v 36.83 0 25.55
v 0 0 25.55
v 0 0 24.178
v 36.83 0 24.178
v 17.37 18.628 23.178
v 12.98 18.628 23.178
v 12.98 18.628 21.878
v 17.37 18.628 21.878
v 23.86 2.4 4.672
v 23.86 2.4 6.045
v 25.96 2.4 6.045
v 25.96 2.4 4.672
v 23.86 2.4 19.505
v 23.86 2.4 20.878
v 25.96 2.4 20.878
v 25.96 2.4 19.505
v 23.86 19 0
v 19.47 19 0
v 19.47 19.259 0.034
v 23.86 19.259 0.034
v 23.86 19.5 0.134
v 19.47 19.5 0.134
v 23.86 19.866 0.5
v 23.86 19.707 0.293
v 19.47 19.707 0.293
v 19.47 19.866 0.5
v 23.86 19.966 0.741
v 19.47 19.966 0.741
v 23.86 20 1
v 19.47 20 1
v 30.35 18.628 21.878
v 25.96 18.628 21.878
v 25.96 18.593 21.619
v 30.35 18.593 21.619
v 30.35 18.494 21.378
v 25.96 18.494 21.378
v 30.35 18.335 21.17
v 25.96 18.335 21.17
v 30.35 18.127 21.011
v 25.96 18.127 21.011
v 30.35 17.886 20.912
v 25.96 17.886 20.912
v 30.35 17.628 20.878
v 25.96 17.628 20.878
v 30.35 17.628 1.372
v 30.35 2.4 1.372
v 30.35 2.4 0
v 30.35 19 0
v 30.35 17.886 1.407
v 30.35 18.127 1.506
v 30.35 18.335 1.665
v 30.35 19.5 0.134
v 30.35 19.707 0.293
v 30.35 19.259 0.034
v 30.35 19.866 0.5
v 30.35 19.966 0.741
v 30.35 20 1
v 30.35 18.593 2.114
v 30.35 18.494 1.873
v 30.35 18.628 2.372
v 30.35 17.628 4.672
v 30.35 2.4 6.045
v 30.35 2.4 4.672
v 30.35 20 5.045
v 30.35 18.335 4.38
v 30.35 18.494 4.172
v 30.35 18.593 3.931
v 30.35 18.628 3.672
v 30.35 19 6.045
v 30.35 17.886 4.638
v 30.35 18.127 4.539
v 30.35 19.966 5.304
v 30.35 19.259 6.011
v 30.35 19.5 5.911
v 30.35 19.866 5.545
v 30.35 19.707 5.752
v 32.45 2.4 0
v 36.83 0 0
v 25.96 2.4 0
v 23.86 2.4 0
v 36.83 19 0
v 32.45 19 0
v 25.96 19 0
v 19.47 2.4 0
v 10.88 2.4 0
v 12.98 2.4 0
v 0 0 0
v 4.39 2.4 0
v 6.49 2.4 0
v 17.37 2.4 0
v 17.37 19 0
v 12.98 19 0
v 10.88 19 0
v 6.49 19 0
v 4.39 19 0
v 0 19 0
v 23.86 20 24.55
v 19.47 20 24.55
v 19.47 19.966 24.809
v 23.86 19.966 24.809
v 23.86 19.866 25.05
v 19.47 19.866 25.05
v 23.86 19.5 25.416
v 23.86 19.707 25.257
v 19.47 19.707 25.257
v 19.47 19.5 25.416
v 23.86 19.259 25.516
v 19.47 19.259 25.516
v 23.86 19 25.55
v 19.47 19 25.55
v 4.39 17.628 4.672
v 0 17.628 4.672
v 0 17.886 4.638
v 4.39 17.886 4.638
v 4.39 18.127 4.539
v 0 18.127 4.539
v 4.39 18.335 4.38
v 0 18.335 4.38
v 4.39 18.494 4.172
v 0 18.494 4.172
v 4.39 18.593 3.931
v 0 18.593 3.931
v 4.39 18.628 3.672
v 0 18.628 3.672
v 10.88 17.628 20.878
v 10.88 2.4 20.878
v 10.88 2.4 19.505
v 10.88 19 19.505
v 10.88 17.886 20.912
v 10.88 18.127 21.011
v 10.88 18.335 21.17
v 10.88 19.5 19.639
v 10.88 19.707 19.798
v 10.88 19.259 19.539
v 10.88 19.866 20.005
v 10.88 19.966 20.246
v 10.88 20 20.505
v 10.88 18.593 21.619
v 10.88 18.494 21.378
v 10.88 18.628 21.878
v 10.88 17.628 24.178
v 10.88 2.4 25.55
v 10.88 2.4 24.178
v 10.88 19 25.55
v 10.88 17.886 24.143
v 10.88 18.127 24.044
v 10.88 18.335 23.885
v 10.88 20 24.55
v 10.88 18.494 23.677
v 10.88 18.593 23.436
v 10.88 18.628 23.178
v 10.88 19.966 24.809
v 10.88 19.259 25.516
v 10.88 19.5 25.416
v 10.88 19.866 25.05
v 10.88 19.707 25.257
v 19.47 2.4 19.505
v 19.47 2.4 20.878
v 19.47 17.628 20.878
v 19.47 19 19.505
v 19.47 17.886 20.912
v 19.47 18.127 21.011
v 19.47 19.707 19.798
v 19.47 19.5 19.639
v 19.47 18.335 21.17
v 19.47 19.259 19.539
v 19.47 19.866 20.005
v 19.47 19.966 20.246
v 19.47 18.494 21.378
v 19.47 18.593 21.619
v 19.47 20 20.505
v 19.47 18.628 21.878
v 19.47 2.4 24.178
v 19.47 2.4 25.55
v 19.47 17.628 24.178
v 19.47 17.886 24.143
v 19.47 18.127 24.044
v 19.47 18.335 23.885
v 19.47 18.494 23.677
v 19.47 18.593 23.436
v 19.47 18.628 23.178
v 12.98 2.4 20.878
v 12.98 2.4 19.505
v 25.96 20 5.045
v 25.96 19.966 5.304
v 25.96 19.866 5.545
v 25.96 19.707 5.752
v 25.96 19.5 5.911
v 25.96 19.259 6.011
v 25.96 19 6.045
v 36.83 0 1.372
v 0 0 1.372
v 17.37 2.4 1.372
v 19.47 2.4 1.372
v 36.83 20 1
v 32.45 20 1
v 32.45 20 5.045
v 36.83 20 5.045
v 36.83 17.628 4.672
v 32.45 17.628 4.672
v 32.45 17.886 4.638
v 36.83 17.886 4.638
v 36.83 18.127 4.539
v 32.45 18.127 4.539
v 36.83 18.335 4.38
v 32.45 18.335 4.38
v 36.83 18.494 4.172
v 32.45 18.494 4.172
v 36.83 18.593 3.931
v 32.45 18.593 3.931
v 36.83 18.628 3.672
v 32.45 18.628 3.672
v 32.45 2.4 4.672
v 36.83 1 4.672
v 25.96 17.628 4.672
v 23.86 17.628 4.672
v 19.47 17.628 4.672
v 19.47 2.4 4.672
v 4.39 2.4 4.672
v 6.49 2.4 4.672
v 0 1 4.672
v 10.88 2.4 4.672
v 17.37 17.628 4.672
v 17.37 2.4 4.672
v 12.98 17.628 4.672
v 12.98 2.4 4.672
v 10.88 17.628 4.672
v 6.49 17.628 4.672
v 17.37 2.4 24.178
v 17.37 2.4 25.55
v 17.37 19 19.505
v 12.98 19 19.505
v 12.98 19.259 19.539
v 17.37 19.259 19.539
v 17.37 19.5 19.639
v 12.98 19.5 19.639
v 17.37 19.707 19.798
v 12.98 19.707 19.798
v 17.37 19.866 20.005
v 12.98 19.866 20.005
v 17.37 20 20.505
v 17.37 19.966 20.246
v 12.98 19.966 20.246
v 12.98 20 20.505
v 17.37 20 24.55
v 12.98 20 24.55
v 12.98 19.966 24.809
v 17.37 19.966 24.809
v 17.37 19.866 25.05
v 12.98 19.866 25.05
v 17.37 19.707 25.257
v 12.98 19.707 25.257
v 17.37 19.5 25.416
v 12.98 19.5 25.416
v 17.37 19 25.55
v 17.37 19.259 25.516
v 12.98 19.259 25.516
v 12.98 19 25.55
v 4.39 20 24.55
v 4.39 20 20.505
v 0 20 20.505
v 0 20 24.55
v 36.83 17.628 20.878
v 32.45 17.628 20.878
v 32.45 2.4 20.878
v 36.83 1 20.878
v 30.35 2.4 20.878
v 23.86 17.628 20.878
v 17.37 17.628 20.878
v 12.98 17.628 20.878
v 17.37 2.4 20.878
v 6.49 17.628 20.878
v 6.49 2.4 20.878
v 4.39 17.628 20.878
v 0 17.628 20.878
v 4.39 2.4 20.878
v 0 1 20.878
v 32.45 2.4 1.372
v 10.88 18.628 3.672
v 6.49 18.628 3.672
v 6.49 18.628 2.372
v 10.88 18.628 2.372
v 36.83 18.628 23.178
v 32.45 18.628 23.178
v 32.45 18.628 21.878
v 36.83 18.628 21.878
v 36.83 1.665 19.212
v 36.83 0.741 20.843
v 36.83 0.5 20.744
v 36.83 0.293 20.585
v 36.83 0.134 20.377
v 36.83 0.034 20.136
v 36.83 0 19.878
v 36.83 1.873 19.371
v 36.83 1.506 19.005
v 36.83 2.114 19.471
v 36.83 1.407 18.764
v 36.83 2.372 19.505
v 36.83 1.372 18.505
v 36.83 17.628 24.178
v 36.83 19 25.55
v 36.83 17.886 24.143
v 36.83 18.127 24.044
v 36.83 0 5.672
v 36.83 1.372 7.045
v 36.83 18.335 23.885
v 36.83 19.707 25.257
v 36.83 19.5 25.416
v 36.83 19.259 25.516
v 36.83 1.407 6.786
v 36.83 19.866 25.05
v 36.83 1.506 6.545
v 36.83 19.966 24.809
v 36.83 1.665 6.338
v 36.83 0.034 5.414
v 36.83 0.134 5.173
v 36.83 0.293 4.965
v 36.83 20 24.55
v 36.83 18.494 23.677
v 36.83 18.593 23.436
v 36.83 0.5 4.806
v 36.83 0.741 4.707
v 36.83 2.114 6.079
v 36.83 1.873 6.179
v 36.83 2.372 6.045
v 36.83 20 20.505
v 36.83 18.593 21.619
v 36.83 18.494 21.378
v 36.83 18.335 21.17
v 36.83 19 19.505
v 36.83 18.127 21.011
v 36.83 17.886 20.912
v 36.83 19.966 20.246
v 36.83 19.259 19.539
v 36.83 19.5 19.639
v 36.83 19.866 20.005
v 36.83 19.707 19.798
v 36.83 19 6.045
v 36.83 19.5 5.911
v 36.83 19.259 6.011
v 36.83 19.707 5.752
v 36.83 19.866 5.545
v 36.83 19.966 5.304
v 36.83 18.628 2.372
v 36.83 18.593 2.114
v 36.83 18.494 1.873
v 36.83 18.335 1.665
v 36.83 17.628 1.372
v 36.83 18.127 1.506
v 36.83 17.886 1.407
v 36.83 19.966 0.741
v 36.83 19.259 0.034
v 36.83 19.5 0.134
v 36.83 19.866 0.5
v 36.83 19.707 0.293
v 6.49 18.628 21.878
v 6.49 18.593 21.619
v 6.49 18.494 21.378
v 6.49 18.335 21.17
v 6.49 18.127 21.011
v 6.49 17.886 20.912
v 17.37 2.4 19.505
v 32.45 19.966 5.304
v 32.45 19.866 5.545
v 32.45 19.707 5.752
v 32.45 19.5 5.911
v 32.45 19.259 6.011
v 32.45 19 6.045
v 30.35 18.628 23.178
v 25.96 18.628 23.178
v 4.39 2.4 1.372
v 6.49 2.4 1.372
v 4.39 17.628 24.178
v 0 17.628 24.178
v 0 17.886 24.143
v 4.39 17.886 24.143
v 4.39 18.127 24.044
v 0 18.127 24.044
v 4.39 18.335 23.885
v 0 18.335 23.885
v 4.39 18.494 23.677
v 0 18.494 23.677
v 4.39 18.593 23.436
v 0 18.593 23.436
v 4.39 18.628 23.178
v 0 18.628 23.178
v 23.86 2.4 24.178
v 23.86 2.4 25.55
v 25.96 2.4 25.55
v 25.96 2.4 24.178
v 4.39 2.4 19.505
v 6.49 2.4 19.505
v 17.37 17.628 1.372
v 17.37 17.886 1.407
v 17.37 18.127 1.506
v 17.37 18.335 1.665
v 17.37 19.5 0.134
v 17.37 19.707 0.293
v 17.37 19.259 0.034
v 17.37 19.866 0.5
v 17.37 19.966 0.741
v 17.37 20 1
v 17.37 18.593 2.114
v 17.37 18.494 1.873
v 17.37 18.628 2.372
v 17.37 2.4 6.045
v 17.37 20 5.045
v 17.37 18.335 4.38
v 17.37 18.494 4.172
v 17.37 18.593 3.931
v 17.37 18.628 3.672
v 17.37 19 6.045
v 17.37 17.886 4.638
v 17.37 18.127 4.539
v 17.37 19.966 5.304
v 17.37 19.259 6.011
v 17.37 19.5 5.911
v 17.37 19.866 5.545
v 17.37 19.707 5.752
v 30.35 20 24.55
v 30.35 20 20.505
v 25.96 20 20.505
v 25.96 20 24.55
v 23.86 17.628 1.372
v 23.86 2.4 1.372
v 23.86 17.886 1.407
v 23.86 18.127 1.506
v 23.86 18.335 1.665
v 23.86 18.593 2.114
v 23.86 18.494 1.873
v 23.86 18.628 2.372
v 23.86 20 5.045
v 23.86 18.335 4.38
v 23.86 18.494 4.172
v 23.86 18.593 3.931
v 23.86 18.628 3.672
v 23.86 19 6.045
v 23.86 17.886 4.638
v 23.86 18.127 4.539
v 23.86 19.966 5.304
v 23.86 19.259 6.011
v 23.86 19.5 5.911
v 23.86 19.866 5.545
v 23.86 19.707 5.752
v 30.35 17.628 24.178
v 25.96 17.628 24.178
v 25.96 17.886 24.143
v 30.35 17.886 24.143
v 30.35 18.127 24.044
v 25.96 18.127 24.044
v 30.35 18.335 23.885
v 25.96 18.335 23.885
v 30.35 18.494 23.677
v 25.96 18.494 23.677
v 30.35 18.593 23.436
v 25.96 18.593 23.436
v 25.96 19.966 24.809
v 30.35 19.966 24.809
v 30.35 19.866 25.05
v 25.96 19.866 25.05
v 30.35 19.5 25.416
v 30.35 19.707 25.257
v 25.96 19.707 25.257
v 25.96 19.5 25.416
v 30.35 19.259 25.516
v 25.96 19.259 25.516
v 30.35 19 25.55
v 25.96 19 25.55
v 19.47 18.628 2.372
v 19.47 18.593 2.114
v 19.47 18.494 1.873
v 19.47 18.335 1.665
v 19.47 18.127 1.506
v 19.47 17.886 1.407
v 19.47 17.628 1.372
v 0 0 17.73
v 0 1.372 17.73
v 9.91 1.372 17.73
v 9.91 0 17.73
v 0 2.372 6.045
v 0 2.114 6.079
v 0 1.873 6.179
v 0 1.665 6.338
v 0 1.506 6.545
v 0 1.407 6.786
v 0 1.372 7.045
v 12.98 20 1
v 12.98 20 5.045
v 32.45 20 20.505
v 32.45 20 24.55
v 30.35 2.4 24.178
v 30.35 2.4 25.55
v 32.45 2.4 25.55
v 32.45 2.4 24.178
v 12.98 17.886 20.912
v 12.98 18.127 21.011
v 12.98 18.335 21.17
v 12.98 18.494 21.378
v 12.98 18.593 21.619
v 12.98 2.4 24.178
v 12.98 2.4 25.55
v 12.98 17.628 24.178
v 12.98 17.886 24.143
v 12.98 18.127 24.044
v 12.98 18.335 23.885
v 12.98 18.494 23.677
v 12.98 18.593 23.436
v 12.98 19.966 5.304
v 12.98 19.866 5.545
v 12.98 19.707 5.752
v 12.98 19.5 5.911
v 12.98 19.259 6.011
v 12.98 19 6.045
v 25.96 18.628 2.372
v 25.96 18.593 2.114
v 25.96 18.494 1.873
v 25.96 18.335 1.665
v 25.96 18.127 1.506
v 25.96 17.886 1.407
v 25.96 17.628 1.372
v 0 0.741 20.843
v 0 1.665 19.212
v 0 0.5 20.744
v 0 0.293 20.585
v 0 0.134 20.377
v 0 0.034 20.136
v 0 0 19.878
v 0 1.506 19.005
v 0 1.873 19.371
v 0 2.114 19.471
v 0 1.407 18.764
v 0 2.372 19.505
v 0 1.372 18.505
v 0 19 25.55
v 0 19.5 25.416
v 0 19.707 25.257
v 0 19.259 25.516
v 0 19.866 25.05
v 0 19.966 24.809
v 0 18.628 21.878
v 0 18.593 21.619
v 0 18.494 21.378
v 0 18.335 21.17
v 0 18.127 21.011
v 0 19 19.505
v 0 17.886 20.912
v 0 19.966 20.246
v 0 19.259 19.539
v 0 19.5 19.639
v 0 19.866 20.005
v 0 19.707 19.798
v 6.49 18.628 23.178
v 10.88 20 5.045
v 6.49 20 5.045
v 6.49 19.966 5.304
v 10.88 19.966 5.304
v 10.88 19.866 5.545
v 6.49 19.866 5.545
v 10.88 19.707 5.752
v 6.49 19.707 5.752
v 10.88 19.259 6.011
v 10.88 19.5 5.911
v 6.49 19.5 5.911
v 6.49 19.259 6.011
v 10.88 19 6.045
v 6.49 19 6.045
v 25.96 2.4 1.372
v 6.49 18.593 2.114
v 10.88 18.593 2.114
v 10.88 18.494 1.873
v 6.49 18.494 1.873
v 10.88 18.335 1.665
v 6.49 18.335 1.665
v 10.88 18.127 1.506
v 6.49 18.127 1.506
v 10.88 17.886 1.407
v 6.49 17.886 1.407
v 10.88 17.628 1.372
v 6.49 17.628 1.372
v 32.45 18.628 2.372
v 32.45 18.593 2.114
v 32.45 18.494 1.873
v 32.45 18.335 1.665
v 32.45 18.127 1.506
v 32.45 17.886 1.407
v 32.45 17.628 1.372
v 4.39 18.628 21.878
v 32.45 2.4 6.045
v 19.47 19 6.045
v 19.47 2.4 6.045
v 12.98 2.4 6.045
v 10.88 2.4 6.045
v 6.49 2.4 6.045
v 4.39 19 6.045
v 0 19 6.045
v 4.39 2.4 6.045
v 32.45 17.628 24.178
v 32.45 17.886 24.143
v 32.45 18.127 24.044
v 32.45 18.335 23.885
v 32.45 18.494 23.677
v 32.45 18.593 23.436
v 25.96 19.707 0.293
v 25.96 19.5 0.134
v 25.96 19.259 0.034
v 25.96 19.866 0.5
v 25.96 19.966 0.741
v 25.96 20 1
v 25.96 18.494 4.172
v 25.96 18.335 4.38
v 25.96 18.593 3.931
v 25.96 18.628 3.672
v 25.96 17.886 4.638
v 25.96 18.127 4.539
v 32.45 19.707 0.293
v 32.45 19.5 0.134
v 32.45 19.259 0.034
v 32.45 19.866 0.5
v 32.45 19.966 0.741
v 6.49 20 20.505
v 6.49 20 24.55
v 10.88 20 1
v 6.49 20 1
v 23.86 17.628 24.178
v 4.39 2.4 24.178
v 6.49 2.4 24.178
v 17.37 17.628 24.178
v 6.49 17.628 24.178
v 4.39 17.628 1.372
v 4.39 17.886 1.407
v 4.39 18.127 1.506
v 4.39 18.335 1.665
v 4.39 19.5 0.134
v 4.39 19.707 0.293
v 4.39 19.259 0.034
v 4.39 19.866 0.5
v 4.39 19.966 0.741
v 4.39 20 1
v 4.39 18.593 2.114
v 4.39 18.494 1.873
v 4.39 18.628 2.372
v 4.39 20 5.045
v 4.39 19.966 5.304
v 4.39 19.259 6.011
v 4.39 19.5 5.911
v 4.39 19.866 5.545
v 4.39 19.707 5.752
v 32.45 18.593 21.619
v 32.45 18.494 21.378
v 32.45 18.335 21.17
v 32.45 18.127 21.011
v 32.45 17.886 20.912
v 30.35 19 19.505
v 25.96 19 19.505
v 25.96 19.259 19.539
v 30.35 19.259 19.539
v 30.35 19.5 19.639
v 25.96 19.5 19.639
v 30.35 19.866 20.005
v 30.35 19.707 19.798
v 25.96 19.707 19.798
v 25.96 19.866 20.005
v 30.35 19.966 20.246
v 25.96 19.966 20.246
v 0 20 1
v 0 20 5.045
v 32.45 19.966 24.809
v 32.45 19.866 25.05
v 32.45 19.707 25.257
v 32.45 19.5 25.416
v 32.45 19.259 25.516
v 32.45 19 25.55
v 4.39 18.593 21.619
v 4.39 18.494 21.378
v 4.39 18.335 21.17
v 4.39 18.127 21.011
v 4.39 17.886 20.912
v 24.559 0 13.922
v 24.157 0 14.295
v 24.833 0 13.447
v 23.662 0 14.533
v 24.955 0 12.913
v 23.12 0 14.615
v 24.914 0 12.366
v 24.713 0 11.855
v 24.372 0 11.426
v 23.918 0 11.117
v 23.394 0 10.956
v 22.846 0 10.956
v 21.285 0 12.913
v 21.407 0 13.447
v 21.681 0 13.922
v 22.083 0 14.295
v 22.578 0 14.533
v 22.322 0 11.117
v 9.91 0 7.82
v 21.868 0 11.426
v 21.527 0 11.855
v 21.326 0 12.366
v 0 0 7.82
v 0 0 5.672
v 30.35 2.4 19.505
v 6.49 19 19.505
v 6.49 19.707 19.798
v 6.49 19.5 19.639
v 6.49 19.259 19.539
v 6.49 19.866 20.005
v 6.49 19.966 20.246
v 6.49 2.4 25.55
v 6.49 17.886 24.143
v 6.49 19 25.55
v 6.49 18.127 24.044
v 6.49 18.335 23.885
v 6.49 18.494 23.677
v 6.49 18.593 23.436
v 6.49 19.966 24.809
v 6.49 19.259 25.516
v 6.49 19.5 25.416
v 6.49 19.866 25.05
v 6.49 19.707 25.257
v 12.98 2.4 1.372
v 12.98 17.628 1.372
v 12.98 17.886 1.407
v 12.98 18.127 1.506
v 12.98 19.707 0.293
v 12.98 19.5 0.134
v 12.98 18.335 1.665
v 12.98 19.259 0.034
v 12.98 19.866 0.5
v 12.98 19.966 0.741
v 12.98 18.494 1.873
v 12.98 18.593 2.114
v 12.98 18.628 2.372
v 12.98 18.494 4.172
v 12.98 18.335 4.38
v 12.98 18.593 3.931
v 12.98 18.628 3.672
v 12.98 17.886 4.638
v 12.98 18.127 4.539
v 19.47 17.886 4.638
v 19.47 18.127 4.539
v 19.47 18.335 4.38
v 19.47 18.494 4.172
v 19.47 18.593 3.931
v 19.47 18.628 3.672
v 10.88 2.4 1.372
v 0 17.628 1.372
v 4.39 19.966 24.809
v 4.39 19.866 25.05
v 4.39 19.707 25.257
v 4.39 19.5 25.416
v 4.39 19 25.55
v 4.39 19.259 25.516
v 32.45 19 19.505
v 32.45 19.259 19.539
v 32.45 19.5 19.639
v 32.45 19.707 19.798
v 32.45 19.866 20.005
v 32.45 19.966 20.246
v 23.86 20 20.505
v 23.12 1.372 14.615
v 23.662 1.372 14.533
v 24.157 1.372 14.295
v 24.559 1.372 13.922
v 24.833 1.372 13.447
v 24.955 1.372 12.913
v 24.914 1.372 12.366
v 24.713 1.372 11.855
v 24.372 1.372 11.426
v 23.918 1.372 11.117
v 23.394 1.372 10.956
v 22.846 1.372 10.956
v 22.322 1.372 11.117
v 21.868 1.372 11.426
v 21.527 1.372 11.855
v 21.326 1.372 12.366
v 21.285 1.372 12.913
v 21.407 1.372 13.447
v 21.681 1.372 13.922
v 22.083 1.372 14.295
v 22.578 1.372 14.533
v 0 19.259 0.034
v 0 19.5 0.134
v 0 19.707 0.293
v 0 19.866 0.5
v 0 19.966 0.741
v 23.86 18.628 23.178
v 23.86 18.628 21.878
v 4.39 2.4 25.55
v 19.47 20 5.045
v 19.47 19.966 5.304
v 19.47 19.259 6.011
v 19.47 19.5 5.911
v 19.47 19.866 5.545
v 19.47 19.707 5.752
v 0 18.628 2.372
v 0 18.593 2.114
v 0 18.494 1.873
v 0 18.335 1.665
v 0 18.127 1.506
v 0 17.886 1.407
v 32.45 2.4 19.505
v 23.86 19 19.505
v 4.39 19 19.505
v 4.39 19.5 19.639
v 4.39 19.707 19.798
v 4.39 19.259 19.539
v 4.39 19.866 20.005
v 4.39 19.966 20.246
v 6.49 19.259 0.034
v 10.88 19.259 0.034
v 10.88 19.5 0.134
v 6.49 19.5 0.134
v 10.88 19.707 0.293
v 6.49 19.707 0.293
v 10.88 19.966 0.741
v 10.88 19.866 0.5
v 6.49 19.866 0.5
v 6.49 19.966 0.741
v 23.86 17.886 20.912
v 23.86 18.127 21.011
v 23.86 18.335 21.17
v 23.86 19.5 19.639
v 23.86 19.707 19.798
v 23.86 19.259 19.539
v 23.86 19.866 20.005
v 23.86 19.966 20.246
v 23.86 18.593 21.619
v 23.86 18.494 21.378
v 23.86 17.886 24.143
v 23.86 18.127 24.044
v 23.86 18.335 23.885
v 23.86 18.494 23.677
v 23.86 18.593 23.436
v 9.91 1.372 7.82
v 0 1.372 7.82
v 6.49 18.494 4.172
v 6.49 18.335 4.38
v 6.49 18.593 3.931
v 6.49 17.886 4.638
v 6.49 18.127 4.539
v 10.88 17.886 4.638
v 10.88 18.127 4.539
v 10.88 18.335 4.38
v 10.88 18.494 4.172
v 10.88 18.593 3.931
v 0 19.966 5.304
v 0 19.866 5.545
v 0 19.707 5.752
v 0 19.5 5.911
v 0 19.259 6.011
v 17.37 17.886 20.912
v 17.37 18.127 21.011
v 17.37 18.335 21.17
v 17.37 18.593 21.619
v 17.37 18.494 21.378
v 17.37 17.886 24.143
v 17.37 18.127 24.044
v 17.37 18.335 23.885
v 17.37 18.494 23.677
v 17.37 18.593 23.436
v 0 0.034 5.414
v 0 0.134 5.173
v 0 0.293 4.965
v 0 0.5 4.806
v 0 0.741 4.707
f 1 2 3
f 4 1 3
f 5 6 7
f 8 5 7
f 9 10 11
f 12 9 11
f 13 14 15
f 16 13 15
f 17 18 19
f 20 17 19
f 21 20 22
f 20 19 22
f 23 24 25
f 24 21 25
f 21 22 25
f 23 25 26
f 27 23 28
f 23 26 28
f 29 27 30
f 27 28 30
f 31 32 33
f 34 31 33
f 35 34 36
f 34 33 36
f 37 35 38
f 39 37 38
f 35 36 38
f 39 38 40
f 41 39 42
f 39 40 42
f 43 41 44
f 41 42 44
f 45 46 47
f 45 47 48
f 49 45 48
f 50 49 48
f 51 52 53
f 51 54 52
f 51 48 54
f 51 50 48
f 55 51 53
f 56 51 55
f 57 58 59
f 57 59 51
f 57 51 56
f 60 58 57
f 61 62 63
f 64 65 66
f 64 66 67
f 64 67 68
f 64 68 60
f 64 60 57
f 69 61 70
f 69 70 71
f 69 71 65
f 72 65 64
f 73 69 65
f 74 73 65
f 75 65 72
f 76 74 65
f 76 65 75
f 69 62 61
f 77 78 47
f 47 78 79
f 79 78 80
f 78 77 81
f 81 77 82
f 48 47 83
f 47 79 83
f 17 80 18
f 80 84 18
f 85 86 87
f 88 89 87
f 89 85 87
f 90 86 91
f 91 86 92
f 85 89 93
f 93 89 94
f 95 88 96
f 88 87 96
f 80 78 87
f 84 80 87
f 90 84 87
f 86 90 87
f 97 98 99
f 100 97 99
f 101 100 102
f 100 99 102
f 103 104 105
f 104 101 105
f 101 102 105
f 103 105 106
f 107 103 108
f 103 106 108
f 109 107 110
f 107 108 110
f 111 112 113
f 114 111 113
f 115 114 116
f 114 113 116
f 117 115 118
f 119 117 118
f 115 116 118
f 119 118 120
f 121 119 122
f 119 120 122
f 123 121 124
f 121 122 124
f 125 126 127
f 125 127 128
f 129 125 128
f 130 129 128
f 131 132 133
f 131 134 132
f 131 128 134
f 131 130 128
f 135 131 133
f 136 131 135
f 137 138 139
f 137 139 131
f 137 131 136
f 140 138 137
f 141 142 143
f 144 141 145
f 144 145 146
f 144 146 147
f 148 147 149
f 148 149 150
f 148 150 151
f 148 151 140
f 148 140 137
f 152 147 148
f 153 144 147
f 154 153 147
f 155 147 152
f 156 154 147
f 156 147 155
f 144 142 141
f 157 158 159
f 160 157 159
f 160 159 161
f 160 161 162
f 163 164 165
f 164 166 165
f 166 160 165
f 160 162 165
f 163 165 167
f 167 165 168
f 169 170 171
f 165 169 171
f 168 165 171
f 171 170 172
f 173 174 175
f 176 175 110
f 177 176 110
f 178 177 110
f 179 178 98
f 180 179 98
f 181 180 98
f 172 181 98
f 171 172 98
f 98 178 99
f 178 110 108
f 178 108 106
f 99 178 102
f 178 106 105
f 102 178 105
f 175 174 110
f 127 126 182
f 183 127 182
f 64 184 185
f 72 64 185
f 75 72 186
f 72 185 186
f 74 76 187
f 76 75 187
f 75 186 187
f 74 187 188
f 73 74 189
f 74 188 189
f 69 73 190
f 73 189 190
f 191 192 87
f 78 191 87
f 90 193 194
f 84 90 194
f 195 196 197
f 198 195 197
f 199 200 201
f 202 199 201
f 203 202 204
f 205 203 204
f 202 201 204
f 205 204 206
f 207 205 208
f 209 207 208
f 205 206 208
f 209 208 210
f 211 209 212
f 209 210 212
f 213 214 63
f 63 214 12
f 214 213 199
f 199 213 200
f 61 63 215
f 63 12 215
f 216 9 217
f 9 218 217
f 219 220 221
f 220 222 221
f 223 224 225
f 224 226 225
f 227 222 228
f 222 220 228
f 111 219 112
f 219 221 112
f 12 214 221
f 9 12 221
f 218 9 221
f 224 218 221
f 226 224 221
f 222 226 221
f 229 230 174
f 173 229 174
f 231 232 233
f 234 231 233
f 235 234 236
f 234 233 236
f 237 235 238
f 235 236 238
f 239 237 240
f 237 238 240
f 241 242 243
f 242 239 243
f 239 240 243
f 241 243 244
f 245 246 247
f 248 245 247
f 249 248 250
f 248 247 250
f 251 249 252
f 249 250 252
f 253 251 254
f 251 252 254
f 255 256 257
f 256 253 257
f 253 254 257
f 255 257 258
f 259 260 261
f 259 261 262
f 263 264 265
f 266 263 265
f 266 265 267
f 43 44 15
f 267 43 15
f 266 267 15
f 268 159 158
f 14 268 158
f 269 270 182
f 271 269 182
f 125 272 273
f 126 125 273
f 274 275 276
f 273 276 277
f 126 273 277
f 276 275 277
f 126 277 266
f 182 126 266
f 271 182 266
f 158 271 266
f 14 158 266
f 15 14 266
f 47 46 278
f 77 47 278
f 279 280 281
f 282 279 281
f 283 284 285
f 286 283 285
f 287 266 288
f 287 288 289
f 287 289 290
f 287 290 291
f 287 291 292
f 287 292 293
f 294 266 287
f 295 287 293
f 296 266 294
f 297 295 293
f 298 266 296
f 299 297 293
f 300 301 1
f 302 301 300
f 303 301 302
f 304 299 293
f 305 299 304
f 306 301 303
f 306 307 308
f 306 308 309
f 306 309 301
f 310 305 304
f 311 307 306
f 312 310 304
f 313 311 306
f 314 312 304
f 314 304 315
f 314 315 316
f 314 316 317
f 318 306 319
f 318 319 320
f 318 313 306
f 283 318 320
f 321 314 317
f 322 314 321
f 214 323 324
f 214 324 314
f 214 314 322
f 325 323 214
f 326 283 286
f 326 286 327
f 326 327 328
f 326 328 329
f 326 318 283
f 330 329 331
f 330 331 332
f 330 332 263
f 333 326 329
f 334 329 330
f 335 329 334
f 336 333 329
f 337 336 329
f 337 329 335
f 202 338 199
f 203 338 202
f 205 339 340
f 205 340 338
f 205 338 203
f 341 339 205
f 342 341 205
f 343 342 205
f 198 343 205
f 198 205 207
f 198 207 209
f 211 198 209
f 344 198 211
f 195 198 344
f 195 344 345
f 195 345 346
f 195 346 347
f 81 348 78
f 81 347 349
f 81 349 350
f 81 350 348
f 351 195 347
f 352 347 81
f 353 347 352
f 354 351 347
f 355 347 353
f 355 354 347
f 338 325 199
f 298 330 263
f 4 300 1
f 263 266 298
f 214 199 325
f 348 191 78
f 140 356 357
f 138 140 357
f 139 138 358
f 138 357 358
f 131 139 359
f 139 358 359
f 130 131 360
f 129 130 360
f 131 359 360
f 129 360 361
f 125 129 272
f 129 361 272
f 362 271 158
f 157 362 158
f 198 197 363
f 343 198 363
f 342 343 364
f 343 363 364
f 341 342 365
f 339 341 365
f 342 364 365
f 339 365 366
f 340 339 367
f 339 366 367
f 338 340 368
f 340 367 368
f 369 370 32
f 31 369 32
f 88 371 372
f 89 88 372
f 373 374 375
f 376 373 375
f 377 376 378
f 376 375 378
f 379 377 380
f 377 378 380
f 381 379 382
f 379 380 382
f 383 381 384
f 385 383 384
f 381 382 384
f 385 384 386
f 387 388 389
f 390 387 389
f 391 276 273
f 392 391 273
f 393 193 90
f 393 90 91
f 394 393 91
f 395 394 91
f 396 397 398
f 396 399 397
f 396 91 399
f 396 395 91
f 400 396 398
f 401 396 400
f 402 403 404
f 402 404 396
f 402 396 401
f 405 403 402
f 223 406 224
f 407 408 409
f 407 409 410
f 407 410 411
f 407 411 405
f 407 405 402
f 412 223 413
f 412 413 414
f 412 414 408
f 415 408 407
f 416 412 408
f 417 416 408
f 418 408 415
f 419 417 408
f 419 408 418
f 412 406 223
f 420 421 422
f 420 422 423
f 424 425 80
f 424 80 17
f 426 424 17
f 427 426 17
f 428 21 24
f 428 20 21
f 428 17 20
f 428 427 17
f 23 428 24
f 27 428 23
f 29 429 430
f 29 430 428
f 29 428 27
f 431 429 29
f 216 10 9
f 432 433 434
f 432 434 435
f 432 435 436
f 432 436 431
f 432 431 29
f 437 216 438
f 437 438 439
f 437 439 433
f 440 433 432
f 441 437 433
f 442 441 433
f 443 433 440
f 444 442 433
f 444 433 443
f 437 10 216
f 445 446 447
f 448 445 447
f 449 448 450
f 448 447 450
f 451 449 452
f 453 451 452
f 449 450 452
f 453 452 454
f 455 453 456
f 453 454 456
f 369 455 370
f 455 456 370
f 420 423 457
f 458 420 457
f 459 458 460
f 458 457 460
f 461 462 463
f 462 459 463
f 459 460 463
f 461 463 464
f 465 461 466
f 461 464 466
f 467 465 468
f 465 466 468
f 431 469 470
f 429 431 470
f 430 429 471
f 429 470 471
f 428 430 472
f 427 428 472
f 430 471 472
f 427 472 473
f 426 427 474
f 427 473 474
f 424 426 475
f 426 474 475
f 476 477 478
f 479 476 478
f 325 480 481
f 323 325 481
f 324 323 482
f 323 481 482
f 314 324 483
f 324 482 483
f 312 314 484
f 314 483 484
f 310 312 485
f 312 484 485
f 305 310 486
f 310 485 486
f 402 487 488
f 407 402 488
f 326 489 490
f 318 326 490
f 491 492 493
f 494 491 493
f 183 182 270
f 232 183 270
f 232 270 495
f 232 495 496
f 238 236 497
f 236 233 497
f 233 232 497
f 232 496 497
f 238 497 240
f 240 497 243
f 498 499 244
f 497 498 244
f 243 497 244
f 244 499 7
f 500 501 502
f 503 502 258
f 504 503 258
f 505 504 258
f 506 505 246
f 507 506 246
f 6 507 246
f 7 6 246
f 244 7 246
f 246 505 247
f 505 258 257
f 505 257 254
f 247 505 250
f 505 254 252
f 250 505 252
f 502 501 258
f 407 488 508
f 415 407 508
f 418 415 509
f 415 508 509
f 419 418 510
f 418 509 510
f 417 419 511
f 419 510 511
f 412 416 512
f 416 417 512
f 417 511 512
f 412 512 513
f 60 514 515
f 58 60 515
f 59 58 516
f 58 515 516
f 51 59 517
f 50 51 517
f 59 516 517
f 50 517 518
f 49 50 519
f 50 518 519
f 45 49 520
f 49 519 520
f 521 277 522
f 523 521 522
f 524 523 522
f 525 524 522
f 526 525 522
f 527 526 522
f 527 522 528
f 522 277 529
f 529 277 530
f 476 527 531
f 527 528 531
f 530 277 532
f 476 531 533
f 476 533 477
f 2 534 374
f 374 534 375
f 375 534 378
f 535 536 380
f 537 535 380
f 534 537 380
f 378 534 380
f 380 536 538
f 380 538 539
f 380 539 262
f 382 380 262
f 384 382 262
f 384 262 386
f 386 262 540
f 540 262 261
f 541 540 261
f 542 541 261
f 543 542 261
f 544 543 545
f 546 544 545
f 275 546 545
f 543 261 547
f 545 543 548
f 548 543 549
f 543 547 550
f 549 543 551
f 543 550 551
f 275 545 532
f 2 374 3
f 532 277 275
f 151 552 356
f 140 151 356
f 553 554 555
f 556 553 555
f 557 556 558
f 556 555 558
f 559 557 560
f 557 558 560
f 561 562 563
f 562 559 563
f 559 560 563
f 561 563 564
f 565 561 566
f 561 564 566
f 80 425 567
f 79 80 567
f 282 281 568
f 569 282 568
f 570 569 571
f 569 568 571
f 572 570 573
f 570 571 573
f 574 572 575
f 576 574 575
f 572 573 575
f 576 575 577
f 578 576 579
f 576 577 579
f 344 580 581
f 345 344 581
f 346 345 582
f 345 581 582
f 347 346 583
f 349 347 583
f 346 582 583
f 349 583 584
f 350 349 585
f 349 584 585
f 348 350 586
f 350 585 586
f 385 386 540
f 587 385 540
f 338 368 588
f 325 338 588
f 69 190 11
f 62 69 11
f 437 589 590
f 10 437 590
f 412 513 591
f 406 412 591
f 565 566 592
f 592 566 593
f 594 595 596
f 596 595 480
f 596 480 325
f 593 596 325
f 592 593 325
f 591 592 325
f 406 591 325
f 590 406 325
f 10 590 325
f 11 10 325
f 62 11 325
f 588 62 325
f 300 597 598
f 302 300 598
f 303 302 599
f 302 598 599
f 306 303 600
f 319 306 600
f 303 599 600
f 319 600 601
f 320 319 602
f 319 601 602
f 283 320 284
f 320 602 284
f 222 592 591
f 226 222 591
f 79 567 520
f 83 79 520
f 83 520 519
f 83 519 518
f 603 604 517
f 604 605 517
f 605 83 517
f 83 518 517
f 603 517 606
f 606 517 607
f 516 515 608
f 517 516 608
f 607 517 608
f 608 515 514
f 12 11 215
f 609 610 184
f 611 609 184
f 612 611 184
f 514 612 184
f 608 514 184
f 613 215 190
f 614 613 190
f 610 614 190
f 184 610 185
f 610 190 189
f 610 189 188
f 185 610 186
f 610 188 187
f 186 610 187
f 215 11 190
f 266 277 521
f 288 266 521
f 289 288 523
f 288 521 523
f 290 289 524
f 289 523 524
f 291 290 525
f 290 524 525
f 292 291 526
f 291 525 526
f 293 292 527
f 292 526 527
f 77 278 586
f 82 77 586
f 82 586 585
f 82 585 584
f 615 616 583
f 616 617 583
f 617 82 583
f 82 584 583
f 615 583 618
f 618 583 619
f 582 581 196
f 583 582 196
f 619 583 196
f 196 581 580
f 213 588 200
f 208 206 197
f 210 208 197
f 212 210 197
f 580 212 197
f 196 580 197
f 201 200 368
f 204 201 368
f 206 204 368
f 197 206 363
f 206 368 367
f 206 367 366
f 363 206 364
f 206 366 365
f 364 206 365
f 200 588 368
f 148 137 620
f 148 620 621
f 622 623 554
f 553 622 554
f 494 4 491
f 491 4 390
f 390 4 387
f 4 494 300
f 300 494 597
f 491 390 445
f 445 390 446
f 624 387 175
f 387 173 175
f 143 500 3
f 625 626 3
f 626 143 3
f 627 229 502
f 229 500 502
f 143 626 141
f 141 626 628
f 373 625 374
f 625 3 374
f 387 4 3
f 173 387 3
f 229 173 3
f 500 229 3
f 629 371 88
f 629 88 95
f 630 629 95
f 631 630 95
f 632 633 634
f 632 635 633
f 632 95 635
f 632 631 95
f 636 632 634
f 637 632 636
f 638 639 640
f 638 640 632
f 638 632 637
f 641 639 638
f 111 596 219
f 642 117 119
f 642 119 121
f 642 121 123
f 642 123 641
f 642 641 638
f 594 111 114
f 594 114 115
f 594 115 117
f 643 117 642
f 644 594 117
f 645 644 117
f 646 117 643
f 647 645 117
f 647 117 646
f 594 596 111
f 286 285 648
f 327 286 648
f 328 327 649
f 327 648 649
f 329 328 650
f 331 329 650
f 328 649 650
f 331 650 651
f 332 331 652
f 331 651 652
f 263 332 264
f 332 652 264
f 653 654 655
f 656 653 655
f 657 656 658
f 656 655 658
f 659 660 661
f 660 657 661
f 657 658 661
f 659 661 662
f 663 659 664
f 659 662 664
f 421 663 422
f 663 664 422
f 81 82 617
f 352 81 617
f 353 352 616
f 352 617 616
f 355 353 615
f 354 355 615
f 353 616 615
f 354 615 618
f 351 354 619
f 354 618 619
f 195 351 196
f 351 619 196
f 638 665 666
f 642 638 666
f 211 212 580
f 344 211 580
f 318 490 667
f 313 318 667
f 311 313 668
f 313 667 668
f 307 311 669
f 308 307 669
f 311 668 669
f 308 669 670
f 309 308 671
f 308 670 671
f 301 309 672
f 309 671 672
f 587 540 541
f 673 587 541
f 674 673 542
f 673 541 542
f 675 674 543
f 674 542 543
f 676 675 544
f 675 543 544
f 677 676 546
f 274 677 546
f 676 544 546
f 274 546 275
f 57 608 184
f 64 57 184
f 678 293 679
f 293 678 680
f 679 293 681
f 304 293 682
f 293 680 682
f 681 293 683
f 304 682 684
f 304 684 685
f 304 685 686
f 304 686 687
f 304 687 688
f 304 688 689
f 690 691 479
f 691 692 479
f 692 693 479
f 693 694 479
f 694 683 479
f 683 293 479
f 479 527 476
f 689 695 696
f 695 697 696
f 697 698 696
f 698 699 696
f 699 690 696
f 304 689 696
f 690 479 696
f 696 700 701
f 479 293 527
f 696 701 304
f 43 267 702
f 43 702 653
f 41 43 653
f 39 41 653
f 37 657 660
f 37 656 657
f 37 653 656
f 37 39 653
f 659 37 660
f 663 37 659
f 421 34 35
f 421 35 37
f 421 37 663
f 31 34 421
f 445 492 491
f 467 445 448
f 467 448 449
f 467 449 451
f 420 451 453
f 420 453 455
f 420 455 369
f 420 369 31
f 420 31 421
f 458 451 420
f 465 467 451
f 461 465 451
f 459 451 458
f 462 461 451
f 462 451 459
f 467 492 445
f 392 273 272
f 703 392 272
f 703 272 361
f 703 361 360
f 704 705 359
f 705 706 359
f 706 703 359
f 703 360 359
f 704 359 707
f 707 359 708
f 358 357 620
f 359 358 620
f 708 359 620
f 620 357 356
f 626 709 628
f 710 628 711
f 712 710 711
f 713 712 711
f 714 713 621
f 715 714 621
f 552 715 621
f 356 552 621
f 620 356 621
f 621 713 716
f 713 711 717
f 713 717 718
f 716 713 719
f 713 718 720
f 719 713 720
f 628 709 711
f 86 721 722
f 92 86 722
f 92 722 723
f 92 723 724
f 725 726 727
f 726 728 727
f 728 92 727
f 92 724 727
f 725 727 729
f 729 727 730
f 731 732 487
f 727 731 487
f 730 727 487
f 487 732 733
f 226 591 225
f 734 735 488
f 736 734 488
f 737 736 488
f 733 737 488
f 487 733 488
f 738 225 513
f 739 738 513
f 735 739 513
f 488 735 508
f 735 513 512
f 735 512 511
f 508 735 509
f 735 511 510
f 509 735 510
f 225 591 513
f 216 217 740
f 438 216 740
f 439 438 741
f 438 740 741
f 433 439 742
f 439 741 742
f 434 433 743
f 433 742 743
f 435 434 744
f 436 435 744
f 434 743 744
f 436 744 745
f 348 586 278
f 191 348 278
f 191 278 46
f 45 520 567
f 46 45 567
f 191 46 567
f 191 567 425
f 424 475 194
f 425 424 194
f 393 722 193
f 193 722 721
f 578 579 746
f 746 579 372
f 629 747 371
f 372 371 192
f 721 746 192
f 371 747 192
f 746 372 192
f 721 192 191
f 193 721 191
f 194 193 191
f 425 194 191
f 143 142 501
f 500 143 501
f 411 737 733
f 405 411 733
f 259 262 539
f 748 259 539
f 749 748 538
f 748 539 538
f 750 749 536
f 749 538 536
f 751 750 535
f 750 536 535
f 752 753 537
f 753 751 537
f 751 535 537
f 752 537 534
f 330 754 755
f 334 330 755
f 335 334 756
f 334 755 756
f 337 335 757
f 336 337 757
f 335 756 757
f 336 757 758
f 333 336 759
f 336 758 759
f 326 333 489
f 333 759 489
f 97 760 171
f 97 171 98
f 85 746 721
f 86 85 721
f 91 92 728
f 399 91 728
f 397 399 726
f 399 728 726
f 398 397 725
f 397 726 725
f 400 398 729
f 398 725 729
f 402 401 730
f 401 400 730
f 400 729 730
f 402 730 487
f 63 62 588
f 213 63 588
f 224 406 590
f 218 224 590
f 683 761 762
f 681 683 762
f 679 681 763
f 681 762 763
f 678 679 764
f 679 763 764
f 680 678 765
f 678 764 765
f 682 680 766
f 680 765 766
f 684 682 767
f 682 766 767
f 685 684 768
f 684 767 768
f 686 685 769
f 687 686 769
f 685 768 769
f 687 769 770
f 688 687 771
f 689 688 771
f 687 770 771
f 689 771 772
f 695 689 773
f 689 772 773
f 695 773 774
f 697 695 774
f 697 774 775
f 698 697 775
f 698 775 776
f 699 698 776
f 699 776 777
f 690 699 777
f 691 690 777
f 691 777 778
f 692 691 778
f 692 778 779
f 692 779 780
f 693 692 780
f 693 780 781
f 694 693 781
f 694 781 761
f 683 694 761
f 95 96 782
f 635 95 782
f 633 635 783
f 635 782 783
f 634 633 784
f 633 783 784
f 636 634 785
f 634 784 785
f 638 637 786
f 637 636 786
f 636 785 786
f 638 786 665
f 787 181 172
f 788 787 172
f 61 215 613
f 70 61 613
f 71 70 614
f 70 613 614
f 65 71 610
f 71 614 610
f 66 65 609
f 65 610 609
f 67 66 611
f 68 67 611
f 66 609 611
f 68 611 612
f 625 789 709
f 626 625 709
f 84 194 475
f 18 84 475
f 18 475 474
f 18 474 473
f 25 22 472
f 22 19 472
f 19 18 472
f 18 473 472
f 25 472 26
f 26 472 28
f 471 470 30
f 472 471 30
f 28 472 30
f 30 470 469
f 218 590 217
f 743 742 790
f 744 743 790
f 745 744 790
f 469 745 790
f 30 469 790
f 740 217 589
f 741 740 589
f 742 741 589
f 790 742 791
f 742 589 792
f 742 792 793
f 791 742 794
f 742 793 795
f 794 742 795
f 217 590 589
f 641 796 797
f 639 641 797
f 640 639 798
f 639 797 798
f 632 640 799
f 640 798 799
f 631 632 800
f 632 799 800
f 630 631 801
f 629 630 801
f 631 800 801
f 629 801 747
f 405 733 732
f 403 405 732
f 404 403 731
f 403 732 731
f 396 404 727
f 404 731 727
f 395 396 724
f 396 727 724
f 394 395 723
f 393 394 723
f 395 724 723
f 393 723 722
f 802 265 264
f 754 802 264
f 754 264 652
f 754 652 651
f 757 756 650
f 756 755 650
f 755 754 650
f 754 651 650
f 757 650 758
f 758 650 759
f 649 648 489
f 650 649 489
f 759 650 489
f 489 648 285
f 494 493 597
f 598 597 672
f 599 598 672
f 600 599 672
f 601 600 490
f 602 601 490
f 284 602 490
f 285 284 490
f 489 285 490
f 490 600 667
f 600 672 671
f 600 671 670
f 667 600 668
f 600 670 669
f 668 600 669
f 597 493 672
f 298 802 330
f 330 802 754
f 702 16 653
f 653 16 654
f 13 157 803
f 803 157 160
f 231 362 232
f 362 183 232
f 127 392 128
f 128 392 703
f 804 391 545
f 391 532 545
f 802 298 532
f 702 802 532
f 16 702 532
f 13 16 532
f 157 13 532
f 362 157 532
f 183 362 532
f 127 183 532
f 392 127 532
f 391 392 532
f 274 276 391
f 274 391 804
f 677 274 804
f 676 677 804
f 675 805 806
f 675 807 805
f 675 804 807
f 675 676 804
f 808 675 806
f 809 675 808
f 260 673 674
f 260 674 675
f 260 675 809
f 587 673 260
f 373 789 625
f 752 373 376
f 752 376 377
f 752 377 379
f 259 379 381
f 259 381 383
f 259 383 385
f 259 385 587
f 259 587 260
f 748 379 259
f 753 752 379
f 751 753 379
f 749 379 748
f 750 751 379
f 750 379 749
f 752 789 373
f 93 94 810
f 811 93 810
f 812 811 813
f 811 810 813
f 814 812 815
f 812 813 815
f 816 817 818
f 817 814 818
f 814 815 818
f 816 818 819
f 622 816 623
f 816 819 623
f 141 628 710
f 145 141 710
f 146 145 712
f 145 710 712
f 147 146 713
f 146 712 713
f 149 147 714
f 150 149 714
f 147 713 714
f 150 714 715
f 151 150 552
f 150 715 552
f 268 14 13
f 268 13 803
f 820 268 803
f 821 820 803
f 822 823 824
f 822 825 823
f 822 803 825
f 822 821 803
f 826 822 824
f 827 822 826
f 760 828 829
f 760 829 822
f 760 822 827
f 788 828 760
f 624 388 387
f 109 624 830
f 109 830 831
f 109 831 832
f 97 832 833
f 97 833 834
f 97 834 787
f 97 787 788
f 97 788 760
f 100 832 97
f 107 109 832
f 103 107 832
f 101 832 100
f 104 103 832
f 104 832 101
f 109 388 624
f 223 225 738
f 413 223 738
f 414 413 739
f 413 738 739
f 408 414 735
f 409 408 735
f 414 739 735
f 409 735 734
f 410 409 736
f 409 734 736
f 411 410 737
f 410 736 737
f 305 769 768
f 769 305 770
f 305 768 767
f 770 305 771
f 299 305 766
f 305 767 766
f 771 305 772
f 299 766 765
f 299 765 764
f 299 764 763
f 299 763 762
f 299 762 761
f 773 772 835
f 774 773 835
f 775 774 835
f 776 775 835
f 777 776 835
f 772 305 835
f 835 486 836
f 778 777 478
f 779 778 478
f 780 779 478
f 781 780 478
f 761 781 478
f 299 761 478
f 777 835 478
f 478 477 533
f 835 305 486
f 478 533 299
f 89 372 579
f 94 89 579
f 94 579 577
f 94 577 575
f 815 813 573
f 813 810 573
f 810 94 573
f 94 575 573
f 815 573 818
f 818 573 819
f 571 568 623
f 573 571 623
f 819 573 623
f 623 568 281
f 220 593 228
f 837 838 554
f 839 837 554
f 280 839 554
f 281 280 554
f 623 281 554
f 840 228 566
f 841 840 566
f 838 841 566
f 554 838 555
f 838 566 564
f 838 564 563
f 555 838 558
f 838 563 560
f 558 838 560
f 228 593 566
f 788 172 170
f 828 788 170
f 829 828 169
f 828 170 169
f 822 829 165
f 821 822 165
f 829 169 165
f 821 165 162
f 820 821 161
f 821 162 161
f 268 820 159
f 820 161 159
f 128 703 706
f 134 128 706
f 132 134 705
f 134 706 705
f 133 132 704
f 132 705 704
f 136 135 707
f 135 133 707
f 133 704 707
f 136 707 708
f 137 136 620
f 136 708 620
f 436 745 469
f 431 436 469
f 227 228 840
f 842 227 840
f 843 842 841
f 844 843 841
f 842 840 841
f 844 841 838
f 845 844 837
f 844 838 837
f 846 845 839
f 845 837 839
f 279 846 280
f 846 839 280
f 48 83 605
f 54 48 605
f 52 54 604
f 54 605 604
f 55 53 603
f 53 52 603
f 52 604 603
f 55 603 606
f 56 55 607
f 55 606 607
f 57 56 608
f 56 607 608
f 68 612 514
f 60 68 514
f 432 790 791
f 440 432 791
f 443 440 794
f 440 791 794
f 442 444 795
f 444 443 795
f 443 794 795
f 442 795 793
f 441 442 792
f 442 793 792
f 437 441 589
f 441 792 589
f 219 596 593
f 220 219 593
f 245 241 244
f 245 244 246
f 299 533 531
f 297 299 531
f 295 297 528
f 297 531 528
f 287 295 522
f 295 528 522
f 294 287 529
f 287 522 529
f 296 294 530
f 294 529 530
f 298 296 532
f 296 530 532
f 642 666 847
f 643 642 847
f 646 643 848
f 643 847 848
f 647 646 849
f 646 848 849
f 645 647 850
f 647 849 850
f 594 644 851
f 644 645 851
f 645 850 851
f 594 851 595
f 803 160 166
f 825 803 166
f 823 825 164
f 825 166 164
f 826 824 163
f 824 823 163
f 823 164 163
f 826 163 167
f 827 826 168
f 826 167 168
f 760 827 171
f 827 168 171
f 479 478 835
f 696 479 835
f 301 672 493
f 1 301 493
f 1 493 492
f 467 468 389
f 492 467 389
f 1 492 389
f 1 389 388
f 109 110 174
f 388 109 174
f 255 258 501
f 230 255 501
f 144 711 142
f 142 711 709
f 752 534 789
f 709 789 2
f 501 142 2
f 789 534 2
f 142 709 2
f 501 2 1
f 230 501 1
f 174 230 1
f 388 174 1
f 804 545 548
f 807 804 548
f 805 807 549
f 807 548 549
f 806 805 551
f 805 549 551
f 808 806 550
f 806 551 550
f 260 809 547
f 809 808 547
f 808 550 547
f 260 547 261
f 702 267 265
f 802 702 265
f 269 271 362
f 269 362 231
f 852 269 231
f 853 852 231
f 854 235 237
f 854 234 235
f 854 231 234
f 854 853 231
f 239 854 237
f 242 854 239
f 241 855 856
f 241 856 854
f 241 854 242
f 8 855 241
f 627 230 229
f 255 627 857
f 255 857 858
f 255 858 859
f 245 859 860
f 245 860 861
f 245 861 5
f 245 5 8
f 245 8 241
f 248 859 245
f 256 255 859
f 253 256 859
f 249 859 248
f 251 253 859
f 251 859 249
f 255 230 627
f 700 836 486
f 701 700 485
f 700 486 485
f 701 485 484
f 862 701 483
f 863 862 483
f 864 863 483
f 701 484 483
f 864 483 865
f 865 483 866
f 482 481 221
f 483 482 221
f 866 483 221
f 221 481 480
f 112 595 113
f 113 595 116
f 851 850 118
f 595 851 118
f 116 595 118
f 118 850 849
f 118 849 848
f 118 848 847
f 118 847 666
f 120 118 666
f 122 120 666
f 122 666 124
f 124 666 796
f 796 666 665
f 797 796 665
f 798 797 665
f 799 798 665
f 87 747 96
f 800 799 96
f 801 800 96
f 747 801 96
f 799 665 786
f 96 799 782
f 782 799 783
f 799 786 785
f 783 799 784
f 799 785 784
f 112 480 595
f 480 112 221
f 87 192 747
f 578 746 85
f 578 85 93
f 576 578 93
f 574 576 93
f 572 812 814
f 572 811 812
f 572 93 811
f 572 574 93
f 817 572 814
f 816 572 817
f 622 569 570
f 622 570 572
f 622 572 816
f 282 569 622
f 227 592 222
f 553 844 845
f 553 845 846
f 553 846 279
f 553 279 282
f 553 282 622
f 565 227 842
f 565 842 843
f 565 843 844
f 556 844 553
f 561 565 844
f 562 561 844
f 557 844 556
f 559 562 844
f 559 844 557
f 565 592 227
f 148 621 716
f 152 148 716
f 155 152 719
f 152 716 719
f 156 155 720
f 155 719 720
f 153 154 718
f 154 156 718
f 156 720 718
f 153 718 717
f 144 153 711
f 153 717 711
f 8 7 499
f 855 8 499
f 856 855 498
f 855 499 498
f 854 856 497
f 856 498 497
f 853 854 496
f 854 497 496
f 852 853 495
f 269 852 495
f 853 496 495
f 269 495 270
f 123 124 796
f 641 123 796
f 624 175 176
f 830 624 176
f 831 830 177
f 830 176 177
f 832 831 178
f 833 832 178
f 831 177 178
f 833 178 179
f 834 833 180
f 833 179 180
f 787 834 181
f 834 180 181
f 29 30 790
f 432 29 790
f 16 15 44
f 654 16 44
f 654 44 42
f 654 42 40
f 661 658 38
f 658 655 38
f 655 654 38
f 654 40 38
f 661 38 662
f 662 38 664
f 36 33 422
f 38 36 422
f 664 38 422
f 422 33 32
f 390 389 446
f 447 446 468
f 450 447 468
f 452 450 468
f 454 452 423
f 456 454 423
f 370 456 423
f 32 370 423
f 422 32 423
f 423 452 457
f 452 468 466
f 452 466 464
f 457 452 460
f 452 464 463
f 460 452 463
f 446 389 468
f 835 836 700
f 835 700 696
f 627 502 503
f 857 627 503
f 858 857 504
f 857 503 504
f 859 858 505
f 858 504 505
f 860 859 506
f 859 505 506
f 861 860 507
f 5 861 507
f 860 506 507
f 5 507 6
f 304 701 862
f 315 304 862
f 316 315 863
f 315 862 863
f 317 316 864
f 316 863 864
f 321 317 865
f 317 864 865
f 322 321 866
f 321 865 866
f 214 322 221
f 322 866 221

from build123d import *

# Parameters (mm, degrees)
SALIENTE_EXTRUIR1_DEPTH = 36.83
CROQUIS2_R              = 1.84
CROQUIS2_W              = 9.91
CROQUIS2_H              = 9.91
CORTAR_EXTRUIR1_DEPTH   = 49.541066699
CROQUIS3_W              = 2.1
CROQUIS3_H              = 17.6
CORTAR_EXTRUIR2_DEPTH   = 50.084125743


with BuildPart() as part:
    # Croquis1 → Saliente-Extruir1 (new body)
    with BuildSketch(Plane(origin=(0, 0, 0), x_dir=(0, 0, -1), z_dir=(1, 0, 0))):
        with BuildLine():
            Line((0, 0), (0, 19))
            ThreePointArc((0, 19), (-0.292893219, 19.707106781), (-1, 20))
            Line((-1, 20), (-5.045, 20))
            ThreePointArc((-5.045, 20), (-5.752106781, 19.707106781), (-6.045, 19))
            Line((-6.045, 19), (-6.045, 2.3725))
            ThreePointArc((-6.045, 2.3725), (-6.337893219, 1.665393219), (-7.045, 1.3725))
            Line((-7.045, 1.3725), (-18.505, 1.3725))
            ThreePointArc((-18.505, 1.3725), (-19.212106781, 1.665393219), (-19.505, 2.3725))
            Line((-19.505, 2.3725), (-19.505, 19))
            ThreePointArc((-19.505, 19), (-19.797893219, 19.707106781), (-20.505, 20))
            Line((-20.505, 20), (-24.55, 20))
            ThreePointArc((-24.55, 20), (-25.257106781, 19.707106781), (-25.55, 19))
            Line((-25.55, 19), (-25.55, 0))
            Line((-25.55, 0), (-24.1775, 0))
            Line((-24.1775, 0), (-24.1775, 17.6275))
            ThreePointArc((-24.1775, 17.6275), (-23.884606781, 18.334606781), (-23.1775, 18.6275))
            Line((-23.1775, 18.6275), (-21.8775, 18.6275))
            ThreePointArc((-21.8775, 18.6275), (-21.170393219, 18.334606781), (-20.8775, 17.6275))
            Line((-20.8775, 17.6275), (-20.8775, 1))
            ThreePointArc((-20.8775, 1), (-20.584606781, 0.292893219), (-19.8775, 0))
            Line((-19.8775, 0), (-5.6725, 0))
            ThreePointArc((-5.6725, 0), (-4.965393219, 0.292893219), (-4.6725, 1))
            Line((-4.6725, 1), (-4.6725, 17.6275))
            ThreePointArc((-4.6725, 17.6275), (-4.379606781, 18.334606781), (-3.6725, 18.6275))
            Line((-3.6725, 18.6275), (-2.3725, 18.6275))
            ThreePointArc((-2.3725, 18.6275), (-1.665393219, 18.334606781), (-1.3725, 17.6275))
            Line((-1.3725, 17.6275), (-1.3725, 0))
            Line((-1.3725, 0), (0, 0))
        make_face()
    extrude(amount=SALIENTE_EXTRUIR1_DEPTH)

    # Croquis2 → Cortar-Extruir1 (cut, through all)
    with BuildSketch(Plane(origin=(0, 1.3725, 0), x_dir=(1, 0, 0), z_dir=(0, 1, 0))):
        with Locations(Location((23.12, -12.775, 0), (0, 0, 270))):
            Circle(CROQUIS2_R)
        with Locations((4.955, -12.775)):
            Rectangle(CROQUIS2_W, CROQUIS2_H)
    extrude(amount=-CORTAR_EXTRUIR1_DEPTH, mode=Mode.SUBTRACT)

    # Croquis3 → Cortar-Extruir2 (cut, through all)
    with BuildSketch(Plane.XY.offset(25.55)):
        with Locations((5.44, 11.2)):
            Rectangle(CROQUIS3_W, CROQUIS3_H)
        with Locations((11.93, 11.2)):
            Rectangle(CROQUIS3_W, CROQUIS3_H)
        with Locations((18.42, 11.2)):
            Rectangle(CROQUIS3_W, CROQUIS3_H)
        with Locations((24.91, 11.2)):
            Rectangle(CROQUIS3_W, CROQUIS3_H)
        with Locations((31.4, 11.2)):
            Rectangle(CROQUIS3_W, CROQUIS3_H)
    extrude(amount=-CORTAR_EXTRUIR2_DEPTH, mode=Mode.SUBTRACT)


solid = part.part
